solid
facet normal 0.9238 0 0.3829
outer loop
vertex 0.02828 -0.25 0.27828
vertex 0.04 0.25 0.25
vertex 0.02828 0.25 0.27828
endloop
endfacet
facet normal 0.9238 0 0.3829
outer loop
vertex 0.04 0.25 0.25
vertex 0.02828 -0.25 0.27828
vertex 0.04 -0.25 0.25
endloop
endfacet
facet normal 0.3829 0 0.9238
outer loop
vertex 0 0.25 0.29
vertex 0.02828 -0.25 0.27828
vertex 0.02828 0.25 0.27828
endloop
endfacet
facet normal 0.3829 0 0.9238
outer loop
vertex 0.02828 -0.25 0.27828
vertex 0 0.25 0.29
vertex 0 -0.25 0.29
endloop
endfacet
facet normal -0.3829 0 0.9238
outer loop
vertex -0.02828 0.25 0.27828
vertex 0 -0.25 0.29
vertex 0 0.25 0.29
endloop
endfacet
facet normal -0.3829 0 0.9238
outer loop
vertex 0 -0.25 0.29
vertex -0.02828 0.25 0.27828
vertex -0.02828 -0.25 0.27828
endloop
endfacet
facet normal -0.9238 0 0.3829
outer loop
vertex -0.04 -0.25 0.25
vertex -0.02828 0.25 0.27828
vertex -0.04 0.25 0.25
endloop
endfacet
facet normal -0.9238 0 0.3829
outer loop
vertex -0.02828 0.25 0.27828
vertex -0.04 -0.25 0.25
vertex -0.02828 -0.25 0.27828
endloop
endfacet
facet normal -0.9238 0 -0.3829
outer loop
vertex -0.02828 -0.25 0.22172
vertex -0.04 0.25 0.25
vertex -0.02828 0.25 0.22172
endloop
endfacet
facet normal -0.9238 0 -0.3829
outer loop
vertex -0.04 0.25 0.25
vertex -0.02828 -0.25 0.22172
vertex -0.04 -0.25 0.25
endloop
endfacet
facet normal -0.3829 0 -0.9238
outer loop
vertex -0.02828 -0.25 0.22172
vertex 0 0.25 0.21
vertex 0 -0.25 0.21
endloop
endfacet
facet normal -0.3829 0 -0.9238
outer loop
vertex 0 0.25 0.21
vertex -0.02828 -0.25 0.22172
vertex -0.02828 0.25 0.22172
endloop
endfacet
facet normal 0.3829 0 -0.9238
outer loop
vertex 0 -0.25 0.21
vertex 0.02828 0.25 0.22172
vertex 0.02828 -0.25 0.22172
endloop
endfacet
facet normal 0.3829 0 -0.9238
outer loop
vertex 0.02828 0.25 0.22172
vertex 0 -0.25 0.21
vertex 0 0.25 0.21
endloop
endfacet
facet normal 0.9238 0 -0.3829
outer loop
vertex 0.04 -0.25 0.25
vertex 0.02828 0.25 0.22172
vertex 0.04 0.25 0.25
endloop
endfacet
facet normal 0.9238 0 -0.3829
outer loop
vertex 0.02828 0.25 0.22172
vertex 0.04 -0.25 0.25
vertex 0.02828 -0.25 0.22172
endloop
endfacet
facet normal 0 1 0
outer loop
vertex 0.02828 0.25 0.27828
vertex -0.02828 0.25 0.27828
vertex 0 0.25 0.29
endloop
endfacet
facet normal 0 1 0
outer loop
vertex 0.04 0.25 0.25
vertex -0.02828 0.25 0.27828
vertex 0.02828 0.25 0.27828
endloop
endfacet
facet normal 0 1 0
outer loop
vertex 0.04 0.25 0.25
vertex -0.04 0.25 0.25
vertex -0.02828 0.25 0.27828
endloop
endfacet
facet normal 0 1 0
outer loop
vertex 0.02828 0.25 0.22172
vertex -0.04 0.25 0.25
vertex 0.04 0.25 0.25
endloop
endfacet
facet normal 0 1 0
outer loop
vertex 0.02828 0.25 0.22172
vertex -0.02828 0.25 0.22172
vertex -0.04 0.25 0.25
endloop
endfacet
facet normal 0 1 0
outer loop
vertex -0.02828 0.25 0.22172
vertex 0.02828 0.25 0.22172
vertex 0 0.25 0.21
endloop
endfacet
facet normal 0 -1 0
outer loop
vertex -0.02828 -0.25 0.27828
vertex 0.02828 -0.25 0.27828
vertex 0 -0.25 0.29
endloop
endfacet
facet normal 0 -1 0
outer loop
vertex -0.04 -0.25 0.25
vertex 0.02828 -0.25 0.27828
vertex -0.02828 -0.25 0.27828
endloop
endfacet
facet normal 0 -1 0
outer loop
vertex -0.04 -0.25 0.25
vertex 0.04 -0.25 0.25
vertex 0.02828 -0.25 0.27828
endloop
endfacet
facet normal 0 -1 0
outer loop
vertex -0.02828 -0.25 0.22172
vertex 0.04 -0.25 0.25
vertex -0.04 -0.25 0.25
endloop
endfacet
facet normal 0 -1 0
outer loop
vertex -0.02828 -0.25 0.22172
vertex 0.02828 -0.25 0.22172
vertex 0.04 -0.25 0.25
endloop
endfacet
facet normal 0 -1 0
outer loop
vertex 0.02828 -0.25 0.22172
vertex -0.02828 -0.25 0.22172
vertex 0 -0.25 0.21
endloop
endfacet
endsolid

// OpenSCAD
// file: lib.scad
function x(v) = v[0];
function y(v) = v[1];
function z(v) = v[2];
function add(v1,v2) = [ for (i = [ 0 : len(v1)-1 ]) v1[i] + v2[i] ];
function xv(d) = [d,0,0];
function yv(d) = [0,d,0];
function zv(d) = [0,0,d];

module box(v) { cube(size=v, center=true); }
module cyl(r1,r2,h) { cylinder(r1=r1, r2=r2, h=h, center=true); }

function grow(n,v) = [x(v)+n*2, y(v)+n*2, z(v)+n*2];

module rbox(v, radius=1) {
	cx = x(v)/2-radius;
	cy = y(v)/2-radius;
	cz = z(v)/2-radius;

	hull() {
		translate([cx,cy,cz]) sphere(r=radius);
		translate([cx,cy,-cz]) sphere(r=radius);
		translate([cx,-cy,cz]) sphere(r=radius);
		translate([cx,-cy,-cz]) sphere(r=radius);
		translate([-cx,cy,cz]) sphere(r=radius);
		translate([-cx,cy,-cz]) sphere(r=radius);
		translate([-cx,-cy,cz]) sphere(r=radius);
		translate([-cx,-cy,-cz]) sphere(r=radius);
	}
}

module fillet(r=1) {
  minkowski() {
    difference() {
      children();
      minkowski() {
        difference() {
          minkowski() {
            children();
            sphere(r=r);
          }
          children();
        }
        sphere(r=r);
      }
    }
    sphere(r=r);
  }
}
// main file
use <lib.scad>

module body() {
	translate([0,0,0.25]) rotate([90,0,0]) cyl(0.2, 0.2, 0.4);
}

module foot() {
	translate([0,0,0.1]) rotate([0,-90,0]) cyl(0.2, 0.2, 0.3, $fn=3);
}

module shaft() {
	translate([0,0,0.25]) rotate([90,0,0]) cyl(0.04, 0.04, 0.5);
}

hd = 72;
ld = 8;

//fillet(0.01, $fn=hd/8) body($fn=hd);
//body($fn=ld);
//fillet(0.01, $fn=hd/8) foot($fn=hd);
//foot($fn=ld);
//fillet(0.01, $fn=hd/8) shaft($fn=hd);
shaft($fn=ld);
